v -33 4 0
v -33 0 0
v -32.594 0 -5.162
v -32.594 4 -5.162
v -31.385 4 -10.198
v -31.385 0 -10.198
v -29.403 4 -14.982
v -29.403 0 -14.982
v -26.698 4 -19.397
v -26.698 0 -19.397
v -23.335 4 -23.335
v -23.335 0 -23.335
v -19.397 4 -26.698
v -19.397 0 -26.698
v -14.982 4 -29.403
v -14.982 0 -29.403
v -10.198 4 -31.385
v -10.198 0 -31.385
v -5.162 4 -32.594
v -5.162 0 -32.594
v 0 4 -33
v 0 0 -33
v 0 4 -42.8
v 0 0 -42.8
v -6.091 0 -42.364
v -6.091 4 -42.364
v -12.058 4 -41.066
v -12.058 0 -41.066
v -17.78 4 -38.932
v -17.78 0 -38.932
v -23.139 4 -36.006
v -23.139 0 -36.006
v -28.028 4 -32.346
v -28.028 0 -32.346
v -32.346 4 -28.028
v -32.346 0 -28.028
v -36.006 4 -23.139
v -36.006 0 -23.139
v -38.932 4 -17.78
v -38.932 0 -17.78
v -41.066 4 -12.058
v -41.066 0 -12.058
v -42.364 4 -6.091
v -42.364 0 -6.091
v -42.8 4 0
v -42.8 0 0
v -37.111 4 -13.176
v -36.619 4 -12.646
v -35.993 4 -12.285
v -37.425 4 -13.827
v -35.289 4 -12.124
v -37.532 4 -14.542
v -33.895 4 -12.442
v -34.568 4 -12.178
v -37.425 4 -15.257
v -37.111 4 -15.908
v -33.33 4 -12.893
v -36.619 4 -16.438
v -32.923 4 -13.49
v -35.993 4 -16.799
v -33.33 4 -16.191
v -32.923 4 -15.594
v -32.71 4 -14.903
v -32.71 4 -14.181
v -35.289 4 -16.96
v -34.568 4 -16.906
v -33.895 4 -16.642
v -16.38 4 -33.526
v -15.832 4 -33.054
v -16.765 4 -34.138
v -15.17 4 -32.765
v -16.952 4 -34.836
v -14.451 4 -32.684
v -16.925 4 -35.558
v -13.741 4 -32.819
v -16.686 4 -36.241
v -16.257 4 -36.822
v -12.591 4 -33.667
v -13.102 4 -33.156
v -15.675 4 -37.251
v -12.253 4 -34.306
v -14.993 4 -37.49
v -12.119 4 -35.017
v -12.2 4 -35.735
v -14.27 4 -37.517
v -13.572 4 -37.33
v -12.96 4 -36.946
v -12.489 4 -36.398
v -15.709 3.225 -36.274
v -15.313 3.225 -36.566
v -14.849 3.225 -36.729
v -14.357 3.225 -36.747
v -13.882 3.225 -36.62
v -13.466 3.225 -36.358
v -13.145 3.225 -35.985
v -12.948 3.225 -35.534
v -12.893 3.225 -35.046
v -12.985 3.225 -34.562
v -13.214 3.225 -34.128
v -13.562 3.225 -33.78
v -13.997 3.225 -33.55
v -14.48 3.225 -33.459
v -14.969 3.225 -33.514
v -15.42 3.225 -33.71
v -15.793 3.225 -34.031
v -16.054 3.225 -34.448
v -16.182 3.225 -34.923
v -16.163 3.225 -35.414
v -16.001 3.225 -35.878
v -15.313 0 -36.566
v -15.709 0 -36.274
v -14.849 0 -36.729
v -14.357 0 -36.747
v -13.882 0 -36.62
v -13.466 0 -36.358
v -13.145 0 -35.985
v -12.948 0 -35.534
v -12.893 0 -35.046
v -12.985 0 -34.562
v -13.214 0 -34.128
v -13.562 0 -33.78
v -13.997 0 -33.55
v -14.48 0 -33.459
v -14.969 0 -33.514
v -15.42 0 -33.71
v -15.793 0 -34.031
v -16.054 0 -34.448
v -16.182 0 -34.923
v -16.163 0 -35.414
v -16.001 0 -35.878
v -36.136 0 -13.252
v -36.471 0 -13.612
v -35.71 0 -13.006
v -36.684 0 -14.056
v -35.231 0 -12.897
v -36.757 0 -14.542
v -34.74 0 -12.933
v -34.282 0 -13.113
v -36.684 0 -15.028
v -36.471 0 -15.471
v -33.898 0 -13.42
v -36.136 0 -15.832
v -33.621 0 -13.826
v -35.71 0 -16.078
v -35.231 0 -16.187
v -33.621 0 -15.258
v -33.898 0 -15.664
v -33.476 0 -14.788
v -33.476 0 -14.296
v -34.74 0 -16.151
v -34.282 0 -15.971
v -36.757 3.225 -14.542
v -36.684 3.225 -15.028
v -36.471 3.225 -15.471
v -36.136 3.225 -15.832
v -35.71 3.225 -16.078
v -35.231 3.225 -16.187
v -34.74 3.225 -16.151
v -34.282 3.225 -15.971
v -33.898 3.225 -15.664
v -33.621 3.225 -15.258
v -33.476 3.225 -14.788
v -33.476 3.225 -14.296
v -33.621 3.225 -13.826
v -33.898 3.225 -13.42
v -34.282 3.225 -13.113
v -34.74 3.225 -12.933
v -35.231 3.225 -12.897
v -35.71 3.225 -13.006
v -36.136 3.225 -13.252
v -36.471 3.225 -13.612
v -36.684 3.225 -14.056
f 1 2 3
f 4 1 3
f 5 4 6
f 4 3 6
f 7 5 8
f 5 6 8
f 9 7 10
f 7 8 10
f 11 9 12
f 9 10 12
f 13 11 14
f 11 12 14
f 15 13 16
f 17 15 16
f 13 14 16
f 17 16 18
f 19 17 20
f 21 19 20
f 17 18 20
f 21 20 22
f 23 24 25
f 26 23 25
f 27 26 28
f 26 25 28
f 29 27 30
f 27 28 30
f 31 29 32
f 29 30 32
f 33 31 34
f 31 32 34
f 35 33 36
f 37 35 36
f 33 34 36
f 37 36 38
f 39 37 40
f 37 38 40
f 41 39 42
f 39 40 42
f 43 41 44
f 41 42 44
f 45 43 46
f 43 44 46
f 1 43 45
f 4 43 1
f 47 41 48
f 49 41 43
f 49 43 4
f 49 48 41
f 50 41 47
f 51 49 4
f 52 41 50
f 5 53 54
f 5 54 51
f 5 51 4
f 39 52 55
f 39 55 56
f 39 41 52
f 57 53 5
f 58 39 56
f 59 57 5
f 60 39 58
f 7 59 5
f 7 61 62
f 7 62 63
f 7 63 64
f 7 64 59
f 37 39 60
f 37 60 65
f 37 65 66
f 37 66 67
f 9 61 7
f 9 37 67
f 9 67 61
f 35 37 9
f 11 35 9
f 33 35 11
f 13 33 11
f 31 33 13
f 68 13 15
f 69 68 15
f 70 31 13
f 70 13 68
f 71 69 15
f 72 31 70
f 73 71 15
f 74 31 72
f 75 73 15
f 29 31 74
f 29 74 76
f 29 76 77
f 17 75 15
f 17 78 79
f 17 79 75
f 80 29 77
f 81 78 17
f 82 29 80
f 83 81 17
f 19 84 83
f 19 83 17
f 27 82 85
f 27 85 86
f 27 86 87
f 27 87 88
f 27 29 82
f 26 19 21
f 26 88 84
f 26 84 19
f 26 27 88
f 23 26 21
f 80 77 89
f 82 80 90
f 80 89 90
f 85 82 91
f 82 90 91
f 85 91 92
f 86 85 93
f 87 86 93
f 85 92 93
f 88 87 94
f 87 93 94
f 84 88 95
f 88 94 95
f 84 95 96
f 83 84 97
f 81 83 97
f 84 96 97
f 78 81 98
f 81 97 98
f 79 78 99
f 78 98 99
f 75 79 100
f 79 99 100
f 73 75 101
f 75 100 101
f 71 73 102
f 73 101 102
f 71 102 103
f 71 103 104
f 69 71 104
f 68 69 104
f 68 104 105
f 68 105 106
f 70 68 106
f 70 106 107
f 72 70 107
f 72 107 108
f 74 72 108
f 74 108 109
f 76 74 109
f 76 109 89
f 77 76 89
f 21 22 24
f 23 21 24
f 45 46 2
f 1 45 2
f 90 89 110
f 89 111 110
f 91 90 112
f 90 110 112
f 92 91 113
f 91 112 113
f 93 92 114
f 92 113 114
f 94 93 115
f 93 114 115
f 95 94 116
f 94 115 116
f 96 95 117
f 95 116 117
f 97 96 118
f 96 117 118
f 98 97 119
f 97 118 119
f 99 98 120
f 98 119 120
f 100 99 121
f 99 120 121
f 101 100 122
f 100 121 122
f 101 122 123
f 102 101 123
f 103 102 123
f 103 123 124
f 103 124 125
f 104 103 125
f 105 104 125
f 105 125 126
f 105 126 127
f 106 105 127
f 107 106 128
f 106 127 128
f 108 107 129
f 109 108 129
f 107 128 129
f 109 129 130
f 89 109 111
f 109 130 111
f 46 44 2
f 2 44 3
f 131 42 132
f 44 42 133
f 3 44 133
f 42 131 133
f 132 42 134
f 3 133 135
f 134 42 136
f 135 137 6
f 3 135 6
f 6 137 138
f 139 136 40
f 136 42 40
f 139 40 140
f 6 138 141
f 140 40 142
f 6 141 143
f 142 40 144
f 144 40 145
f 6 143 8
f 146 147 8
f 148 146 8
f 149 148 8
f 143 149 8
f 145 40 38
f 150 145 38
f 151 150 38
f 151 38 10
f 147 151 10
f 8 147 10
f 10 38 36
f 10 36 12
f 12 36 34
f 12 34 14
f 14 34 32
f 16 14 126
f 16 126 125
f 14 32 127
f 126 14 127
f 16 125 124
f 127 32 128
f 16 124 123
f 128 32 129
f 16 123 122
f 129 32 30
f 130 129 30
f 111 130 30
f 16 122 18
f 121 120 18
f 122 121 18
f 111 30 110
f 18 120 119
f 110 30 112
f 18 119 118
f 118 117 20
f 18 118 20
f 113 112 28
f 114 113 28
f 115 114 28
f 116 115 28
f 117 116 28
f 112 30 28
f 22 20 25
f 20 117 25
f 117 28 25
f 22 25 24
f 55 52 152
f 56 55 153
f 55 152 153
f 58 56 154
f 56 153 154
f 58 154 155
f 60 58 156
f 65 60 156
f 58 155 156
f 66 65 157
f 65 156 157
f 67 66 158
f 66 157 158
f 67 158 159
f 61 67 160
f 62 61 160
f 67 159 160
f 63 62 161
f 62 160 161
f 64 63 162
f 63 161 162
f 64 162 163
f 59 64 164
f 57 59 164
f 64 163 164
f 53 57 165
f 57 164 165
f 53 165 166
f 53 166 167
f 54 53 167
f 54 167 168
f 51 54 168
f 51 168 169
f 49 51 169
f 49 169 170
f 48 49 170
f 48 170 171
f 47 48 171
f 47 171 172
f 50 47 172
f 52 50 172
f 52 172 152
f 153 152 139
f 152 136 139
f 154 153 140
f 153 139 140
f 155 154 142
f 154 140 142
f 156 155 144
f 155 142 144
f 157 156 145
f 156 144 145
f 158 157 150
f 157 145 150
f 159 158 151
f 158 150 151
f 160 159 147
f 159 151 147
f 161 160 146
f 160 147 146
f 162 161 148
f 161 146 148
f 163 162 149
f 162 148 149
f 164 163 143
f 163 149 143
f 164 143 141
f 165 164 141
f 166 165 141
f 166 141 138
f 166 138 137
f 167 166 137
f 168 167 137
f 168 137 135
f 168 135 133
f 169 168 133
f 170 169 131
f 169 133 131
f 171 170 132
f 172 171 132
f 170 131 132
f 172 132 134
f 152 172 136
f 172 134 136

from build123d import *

# Parameters (mm, degrees)
BOSS_EXTRUDE1_DEPTH         = 4
M4_TAPPED_HOLE1_D           = 3.3
M4_TAPPED_HOLE1_CSINK_D     = 4.85
M4_TAPPED_HOLE1_CSINK_ANGLE = 90
CIRPATTERN1_COUNT           = 8


with BuildPart() as part:
    # Sketch1 → Boss-Extrude1 (new body)
    with BuildSketch(Plane(origin=(0, 0, 0), x_dir=(1, 0, 0), z_dir=(0, 1, 0))):
        with BuildLine():
            Line((0, 33), (0, 42.8))
            ThreePointArc((0, 42.8), (-30.264170235, 30.264170235), (-42.8, 0))
            Line((-42.8, 0), (-33, 0))
            ThreePointArc((-33, 0), (-23.334523779, 23.334523779), (0, 33))
        make_face()
    extrude(amount=BOSS_EXTRUDE1_DEPTH)

    # M4 Tapped Hole1 (through all)
    with Locations(Plane(origin=(0, 4, 0), x_dir=(1, 0, 0), z_dir=(0, 1, 0))):
        with Locations((-35.107422235, 14.54197043)):
            m4_tapped_hole1 = CounterSinkHole(M4_TAPPED_HOLE1_D / 2, M4_TAPPED_HOLE1_CSINK_D / 2, counter_sink_angle=M4_TAPPED_HOLE1_CSINK_ANGLE)

    # CirPattern1: M4 Tapped Hole1 ×8 about axis, 6 skipped
    cirpattern1_axis = Axis((0, 4, 0), (0, 1, 0))
    add([m4_tapped_hole1.rotate(cirpattern1_axis, i * 360 / CIRPATTERN1_COUNT) for i in range(1, CIRPATTERN1_COUNT) if i not in (1, 2, 3, 4, 5, 6)], mode=Mode.SUBTRACT)


solid = part.part
